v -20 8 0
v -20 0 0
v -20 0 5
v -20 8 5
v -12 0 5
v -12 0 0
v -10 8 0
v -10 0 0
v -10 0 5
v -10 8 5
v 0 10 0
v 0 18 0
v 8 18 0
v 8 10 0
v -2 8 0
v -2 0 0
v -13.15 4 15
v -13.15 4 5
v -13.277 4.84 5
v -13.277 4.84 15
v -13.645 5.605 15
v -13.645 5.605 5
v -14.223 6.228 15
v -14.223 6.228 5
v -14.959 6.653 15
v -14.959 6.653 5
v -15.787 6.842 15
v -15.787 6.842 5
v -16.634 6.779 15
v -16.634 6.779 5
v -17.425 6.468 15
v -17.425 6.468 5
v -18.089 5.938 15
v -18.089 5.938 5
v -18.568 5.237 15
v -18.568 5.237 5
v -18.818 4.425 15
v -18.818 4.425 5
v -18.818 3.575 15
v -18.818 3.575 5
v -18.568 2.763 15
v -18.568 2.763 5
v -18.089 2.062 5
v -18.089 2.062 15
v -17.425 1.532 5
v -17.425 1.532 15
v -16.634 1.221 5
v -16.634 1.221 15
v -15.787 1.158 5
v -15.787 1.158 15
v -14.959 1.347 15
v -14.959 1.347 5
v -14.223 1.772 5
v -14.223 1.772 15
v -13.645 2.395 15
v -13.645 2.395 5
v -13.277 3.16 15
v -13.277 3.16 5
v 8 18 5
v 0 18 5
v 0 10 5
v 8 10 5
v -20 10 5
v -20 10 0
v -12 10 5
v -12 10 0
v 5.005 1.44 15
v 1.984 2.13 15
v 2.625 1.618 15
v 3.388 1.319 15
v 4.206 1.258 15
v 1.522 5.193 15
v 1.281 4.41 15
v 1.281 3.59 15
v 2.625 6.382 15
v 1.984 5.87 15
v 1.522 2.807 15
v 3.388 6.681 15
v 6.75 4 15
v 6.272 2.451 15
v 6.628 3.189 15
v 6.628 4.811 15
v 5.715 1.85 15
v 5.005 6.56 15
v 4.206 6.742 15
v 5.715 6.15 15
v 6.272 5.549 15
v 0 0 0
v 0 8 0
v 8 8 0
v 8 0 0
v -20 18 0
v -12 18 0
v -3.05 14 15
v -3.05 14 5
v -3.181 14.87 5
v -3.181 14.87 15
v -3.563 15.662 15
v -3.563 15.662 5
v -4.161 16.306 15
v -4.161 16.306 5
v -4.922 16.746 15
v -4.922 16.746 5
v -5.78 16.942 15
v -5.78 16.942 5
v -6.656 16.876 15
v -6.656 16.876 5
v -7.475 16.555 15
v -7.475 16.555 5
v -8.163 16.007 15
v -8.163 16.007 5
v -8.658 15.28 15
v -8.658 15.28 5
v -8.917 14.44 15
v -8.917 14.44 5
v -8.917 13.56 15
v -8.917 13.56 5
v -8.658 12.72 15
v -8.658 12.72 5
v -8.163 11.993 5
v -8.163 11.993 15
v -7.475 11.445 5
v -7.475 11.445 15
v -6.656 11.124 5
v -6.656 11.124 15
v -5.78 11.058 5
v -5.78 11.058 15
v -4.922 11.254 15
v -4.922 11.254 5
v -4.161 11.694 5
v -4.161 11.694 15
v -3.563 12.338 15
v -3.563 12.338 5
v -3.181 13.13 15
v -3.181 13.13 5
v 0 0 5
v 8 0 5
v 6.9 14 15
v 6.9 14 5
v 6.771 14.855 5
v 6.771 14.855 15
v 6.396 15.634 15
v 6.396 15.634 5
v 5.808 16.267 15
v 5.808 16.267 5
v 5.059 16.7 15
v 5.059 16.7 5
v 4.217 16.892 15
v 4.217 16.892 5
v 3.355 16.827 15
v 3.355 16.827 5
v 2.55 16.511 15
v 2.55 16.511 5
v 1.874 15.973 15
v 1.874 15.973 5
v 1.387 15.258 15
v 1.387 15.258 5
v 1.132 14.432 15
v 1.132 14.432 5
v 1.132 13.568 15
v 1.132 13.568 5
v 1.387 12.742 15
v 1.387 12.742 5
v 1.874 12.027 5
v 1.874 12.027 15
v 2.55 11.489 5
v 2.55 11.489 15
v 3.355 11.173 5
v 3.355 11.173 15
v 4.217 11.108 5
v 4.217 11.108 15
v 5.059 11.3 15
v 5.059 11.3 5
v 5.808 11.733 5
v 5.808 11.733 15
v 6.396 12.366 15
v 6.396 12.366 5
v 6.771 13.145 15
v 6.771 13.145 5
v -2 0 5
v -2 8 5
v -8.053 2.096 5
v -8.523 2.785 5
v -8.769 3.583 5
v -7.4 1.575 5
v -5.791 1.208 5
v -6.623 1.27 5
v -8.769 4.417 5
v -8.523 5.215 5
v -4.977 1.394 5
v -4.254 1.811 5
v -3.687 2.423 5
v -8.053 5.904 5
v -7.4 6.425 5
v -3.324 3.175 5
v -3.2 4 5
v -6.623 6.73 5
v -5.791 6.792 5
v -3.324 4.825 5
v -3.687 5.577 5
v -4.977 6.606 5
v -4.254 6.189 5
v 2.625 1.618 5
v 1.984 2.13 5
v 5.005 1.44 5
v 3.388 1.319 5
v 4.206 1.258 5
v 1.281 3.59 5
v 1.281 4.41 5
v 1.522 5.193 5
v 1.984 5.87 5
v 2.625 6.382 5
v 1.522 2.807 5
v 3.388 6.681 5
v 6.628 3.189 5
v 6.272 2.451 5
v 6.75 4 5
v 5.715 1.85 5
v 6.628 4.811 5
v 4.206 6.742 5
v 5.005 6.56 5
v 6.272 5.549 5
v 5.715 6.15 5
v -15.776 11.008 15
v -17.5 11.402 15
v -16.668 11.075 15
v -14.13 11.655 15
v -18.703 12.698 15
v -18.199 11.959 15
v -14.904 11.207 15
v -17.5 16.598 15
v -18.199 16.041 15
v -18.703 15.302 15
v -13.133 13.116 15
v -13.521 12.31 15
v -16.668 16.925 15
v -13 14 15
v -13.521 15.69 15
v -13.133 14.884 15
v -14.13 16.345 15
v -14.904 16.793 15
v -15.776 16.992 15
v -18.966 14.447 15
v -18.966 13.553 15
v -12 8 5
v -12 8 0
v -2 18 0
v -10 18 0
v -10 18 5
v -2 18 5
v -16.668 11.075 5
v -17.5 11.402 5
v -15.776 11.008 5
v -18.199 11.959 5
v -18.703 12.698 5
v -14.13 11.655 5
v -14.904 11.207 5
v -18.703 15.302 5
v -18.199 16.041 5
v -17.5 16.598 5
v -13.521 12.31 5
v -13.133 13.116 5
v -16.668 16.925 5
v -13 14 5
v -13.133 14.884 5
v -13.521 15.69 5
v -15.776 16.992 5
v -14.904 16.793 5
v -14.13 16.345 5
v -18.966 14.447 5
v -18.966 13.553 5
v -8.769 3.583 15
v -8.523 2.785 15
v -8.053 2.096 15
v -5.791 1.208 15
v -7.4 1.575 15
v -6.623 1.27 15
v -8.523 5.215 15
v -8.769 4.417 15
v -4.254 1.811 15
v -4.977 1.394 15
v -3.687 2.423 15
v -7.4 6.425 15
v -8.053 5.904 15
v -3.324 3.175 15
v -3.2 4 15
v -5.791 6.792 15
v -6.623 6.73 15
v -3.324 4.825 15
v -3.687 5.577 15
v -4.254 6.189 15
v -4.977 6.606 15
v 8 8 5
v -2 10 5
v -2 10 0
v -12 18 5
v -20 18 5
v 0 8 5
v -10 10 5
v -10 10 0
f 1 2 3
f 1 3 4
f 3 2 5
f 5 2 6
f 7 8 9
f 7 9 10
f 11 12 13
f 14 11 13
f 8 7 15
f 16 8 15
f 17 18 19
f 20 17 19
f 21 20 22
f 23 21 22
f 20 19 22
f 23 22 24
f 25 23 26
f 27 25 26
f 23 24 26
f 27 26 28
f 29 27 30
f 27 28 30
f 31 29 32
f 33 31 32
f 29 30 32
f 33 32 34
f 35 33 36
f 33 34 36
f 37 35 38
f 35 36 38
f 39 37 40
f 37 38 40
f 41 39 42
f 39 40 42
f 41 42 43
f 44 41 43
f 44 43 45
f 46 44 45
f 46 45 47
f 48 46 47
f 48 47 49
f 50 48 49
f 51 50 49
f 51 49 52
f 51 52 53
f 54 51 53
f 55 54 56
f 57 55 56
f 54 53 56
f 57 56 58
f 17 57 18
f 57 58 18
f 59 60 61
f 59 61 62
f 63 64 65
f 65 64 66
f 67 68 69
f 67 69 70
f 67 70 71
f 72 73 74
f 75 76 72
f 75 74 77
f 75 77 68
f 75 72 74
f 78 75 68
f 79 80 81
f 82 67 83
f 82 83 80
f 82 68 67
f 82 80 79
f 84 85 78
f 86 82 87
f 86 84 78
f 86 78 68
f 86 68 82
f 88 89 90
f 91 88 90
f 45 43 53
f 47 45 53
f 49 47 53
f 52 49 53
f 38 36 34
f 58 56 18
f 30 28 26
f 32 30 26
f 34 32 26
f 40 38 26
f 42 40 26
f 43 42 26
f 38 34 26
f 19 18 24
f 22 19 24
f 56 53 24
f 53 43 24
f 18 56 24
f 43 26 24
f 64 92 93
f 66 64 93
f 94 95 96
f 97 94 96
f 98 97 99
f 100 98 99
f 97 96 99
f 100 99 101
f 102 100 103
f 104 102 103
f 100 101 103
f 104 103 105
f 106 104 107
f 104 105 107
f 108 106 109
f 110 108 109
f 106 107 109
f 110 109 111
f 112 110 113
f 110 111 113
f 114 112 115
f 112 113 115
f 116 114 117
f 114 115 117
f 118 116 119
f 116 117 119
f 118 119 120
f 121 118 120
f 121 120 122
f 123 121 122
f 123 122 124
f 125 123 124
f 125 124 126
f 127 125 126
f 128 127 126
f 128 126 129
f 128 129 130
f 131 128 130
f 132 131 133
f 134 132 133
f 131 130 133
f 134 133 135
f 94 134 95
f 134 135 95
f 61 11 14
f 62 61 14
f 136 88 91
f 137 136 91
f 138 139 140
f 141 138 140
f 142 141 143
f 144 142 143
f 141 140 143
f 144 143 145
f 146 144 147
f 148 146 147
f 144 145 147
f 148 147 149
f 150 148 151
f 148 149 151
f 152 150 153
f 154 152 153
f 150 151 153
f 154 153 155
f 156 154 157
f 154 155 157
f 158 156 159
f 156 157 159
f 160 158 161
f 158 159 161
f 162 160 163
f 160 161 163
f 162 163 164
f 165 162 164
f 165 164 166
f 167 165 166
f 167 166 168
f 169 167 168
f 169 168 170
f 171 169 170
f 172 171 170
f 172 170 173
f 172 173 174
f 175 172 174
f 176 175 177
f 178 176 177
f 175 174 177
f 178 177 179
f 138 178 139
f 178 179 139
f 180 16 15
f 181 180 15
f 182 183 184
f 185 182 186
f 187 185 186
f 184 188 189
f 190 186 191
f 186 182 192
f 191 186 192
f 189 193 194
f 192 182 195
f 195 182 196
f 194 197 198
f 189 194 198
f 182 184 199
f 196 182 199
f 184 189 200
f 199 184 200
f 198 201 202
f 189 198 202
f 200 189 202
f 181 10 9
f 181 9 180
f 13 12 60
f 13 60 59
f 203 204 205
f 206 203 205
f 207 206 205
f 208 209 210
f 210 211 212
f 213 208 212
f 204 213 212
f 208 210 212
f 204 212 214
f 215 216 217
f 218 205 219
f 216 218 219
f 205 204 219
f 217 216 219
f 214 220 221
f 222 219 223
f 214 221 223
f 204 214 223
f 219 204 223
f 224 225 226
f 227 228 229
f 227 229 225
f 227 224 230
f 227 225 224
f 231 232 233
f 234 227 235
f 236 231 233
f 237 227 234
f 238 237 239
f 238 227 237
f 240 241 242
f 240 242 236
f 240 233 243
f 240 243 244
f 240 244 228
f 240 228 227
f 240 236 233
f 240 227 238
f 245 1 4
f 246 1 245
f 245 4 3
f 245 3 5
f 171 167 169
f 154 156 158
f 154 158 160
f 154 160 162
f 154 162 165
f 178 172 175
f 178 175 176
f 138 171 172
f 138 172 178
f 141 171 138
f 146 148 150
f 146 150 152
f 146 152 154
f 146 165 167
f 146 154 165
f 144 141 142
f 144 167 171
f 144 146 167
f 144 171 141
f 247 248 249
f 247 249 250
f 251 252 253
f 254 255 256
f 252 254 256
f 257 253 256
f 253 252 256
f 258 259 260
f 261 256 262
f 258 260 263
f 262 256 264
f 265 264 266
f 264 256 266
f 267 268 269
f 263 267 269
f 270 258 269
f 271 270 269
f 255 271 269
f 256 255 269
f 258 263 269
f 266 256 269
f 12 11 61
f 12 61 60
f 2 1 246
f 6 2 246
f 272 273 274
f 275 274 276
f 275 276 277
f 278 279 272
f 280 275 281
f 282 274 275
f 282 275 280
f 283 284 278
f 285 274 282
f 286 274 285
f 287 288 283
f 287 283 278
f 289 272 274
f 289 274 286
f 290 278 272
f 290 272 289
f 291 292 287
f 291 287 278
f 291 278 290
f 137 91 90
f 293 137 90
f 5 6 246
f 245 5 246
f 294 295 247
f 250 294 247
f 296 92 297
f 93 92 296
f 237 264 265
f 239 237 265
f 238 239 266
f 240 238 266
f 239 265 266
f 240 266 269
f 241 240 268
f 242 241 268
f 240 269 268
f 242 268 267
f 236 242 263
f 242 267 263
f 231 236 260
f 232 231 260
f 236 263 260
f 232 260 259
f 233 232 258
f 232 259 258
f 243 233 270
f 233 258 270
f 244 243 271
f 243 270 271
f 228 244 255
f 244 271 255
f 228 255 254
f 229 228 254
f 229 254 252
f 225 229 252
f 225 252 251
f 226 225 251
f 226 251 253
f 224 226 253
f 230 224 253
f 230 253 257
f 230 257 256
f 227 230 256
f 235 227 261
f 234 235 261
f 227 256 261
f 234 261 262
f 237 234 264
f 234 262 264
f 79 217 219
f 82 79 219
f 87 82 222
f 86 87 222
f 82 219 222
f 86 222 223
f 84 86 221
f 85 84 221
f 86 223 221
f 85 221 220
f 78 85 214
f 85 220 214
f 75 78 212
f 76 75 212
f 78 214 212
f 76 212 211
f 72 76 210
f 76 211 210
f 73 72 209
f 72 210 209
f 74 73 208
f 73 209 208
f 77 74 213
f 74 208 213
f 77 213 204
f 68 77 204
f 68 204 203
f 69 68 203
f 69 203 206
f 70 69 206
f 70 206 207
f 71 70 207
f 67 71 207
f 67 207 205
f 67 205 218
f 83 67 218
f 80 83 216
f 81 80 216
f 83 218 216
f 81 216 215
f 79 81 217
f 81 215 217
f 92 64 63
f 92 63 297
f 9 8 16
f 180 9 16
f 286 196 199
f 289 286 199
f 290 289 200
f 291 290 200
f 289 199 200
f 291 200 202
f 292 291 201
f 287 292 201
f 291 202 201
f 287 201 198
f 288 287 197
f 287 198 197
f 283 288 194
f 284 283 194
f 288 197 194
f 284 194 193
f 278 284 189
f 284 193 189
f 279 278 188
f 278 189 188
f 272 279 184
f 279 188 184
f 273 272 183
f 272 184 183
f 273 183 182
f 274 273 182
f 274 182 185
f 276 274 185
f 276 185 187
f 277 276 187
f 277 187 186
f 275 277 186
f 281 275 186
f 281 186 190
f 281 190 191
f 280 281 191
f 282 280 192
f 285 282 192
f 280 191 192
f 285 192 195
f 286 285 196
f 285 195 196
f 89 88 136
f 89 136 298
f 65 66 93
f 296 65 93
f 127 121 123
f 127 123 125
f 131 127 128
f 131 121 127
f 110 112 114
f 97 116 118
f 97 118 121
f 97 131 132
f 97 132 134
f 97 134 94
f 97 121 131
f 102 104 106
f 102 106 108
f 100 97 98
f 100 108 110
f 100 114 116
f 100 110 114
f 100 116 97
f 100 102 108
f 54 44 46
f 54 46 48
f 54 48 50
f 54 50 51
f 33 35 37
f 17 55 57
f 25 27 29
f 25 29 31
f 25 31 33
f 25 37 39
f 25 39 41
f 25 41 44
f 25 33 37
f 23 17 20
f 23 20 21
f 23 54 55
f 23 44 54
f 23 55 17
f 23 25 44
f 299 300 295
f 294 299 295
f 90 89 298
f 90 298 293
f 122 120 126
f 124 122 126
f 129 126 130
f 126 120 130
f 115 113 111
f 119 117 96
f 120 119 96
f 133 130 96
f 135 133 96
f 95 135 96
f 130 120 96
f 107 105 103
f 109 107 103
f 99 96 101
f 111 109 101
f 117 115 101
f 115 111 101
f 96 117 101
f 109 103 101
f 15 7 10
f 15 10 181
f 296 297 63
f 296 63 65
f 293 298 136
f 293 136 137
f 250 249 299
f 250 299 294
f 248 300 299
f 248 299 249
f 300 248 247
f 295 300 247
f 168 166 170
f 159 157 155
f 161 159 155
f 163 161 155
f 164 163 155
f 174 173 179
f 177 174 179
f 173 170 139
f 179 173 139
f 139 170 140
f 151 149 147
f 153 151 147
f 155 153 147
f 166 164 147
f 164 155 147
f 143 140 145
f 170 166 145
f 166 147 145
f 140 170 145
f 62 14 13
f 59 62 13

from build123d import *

# Parameters (mm, degrees)
F0_W     = 8
F0_H     = 8
F1_DEPTH = 5
F2_R     = 3
F2_R_2   = 2.95
F2_R_3   = 2.9
F2_R_4   = 2.85
F2_R_5   = 2.8
F2_R_6   = 2.75
F3_DEPTH = 10


with BuildPart() as f1:
    # F0 (on Top) → F1 (new body)
    with BuildSketch(Plane.XY):
        with Locations((4, 4)):
            Rectangle(F0_W, F0_H)
        with Locations((-6, 4)):
            Rectangle(F0_W, F0_H)
        with Locations((-16, 4)):
            Rectangle(F0_W, F0_H)
        with Locations((4, 14)):
            Rectangle(F0_W, F0_H)
        with Locations((-6, 14)):
            Rectangle(F0_W, F0_H)
        with Locations((-16, 14)):
            Rectangle(F0_W, F0_H)
    extrude(amount=F1_DEPTH)


with BuildPart() as f3:
    # F2 (on face) → F3 (new body)
    with BuildSketch(Plane.XY.offset(5)):
        with Locations((-16, 14)):
            Circle(F2_R)
        with Locations((-6, 14)):
            Circle(F2_R_2)
        with Locations((4, 14)):
            Circle(F2_R_3)
        with Locations((-16, 4)):
            Circle(F2_R_4)
        with Locations((-6, 4)):
            Circle(F2_R_5)
        with Locations((4, 4)):
            Circle(F2_R_6)
    extrude(amount=F3_DEPTH)


solid = Compound([f1.part, f3.part])
